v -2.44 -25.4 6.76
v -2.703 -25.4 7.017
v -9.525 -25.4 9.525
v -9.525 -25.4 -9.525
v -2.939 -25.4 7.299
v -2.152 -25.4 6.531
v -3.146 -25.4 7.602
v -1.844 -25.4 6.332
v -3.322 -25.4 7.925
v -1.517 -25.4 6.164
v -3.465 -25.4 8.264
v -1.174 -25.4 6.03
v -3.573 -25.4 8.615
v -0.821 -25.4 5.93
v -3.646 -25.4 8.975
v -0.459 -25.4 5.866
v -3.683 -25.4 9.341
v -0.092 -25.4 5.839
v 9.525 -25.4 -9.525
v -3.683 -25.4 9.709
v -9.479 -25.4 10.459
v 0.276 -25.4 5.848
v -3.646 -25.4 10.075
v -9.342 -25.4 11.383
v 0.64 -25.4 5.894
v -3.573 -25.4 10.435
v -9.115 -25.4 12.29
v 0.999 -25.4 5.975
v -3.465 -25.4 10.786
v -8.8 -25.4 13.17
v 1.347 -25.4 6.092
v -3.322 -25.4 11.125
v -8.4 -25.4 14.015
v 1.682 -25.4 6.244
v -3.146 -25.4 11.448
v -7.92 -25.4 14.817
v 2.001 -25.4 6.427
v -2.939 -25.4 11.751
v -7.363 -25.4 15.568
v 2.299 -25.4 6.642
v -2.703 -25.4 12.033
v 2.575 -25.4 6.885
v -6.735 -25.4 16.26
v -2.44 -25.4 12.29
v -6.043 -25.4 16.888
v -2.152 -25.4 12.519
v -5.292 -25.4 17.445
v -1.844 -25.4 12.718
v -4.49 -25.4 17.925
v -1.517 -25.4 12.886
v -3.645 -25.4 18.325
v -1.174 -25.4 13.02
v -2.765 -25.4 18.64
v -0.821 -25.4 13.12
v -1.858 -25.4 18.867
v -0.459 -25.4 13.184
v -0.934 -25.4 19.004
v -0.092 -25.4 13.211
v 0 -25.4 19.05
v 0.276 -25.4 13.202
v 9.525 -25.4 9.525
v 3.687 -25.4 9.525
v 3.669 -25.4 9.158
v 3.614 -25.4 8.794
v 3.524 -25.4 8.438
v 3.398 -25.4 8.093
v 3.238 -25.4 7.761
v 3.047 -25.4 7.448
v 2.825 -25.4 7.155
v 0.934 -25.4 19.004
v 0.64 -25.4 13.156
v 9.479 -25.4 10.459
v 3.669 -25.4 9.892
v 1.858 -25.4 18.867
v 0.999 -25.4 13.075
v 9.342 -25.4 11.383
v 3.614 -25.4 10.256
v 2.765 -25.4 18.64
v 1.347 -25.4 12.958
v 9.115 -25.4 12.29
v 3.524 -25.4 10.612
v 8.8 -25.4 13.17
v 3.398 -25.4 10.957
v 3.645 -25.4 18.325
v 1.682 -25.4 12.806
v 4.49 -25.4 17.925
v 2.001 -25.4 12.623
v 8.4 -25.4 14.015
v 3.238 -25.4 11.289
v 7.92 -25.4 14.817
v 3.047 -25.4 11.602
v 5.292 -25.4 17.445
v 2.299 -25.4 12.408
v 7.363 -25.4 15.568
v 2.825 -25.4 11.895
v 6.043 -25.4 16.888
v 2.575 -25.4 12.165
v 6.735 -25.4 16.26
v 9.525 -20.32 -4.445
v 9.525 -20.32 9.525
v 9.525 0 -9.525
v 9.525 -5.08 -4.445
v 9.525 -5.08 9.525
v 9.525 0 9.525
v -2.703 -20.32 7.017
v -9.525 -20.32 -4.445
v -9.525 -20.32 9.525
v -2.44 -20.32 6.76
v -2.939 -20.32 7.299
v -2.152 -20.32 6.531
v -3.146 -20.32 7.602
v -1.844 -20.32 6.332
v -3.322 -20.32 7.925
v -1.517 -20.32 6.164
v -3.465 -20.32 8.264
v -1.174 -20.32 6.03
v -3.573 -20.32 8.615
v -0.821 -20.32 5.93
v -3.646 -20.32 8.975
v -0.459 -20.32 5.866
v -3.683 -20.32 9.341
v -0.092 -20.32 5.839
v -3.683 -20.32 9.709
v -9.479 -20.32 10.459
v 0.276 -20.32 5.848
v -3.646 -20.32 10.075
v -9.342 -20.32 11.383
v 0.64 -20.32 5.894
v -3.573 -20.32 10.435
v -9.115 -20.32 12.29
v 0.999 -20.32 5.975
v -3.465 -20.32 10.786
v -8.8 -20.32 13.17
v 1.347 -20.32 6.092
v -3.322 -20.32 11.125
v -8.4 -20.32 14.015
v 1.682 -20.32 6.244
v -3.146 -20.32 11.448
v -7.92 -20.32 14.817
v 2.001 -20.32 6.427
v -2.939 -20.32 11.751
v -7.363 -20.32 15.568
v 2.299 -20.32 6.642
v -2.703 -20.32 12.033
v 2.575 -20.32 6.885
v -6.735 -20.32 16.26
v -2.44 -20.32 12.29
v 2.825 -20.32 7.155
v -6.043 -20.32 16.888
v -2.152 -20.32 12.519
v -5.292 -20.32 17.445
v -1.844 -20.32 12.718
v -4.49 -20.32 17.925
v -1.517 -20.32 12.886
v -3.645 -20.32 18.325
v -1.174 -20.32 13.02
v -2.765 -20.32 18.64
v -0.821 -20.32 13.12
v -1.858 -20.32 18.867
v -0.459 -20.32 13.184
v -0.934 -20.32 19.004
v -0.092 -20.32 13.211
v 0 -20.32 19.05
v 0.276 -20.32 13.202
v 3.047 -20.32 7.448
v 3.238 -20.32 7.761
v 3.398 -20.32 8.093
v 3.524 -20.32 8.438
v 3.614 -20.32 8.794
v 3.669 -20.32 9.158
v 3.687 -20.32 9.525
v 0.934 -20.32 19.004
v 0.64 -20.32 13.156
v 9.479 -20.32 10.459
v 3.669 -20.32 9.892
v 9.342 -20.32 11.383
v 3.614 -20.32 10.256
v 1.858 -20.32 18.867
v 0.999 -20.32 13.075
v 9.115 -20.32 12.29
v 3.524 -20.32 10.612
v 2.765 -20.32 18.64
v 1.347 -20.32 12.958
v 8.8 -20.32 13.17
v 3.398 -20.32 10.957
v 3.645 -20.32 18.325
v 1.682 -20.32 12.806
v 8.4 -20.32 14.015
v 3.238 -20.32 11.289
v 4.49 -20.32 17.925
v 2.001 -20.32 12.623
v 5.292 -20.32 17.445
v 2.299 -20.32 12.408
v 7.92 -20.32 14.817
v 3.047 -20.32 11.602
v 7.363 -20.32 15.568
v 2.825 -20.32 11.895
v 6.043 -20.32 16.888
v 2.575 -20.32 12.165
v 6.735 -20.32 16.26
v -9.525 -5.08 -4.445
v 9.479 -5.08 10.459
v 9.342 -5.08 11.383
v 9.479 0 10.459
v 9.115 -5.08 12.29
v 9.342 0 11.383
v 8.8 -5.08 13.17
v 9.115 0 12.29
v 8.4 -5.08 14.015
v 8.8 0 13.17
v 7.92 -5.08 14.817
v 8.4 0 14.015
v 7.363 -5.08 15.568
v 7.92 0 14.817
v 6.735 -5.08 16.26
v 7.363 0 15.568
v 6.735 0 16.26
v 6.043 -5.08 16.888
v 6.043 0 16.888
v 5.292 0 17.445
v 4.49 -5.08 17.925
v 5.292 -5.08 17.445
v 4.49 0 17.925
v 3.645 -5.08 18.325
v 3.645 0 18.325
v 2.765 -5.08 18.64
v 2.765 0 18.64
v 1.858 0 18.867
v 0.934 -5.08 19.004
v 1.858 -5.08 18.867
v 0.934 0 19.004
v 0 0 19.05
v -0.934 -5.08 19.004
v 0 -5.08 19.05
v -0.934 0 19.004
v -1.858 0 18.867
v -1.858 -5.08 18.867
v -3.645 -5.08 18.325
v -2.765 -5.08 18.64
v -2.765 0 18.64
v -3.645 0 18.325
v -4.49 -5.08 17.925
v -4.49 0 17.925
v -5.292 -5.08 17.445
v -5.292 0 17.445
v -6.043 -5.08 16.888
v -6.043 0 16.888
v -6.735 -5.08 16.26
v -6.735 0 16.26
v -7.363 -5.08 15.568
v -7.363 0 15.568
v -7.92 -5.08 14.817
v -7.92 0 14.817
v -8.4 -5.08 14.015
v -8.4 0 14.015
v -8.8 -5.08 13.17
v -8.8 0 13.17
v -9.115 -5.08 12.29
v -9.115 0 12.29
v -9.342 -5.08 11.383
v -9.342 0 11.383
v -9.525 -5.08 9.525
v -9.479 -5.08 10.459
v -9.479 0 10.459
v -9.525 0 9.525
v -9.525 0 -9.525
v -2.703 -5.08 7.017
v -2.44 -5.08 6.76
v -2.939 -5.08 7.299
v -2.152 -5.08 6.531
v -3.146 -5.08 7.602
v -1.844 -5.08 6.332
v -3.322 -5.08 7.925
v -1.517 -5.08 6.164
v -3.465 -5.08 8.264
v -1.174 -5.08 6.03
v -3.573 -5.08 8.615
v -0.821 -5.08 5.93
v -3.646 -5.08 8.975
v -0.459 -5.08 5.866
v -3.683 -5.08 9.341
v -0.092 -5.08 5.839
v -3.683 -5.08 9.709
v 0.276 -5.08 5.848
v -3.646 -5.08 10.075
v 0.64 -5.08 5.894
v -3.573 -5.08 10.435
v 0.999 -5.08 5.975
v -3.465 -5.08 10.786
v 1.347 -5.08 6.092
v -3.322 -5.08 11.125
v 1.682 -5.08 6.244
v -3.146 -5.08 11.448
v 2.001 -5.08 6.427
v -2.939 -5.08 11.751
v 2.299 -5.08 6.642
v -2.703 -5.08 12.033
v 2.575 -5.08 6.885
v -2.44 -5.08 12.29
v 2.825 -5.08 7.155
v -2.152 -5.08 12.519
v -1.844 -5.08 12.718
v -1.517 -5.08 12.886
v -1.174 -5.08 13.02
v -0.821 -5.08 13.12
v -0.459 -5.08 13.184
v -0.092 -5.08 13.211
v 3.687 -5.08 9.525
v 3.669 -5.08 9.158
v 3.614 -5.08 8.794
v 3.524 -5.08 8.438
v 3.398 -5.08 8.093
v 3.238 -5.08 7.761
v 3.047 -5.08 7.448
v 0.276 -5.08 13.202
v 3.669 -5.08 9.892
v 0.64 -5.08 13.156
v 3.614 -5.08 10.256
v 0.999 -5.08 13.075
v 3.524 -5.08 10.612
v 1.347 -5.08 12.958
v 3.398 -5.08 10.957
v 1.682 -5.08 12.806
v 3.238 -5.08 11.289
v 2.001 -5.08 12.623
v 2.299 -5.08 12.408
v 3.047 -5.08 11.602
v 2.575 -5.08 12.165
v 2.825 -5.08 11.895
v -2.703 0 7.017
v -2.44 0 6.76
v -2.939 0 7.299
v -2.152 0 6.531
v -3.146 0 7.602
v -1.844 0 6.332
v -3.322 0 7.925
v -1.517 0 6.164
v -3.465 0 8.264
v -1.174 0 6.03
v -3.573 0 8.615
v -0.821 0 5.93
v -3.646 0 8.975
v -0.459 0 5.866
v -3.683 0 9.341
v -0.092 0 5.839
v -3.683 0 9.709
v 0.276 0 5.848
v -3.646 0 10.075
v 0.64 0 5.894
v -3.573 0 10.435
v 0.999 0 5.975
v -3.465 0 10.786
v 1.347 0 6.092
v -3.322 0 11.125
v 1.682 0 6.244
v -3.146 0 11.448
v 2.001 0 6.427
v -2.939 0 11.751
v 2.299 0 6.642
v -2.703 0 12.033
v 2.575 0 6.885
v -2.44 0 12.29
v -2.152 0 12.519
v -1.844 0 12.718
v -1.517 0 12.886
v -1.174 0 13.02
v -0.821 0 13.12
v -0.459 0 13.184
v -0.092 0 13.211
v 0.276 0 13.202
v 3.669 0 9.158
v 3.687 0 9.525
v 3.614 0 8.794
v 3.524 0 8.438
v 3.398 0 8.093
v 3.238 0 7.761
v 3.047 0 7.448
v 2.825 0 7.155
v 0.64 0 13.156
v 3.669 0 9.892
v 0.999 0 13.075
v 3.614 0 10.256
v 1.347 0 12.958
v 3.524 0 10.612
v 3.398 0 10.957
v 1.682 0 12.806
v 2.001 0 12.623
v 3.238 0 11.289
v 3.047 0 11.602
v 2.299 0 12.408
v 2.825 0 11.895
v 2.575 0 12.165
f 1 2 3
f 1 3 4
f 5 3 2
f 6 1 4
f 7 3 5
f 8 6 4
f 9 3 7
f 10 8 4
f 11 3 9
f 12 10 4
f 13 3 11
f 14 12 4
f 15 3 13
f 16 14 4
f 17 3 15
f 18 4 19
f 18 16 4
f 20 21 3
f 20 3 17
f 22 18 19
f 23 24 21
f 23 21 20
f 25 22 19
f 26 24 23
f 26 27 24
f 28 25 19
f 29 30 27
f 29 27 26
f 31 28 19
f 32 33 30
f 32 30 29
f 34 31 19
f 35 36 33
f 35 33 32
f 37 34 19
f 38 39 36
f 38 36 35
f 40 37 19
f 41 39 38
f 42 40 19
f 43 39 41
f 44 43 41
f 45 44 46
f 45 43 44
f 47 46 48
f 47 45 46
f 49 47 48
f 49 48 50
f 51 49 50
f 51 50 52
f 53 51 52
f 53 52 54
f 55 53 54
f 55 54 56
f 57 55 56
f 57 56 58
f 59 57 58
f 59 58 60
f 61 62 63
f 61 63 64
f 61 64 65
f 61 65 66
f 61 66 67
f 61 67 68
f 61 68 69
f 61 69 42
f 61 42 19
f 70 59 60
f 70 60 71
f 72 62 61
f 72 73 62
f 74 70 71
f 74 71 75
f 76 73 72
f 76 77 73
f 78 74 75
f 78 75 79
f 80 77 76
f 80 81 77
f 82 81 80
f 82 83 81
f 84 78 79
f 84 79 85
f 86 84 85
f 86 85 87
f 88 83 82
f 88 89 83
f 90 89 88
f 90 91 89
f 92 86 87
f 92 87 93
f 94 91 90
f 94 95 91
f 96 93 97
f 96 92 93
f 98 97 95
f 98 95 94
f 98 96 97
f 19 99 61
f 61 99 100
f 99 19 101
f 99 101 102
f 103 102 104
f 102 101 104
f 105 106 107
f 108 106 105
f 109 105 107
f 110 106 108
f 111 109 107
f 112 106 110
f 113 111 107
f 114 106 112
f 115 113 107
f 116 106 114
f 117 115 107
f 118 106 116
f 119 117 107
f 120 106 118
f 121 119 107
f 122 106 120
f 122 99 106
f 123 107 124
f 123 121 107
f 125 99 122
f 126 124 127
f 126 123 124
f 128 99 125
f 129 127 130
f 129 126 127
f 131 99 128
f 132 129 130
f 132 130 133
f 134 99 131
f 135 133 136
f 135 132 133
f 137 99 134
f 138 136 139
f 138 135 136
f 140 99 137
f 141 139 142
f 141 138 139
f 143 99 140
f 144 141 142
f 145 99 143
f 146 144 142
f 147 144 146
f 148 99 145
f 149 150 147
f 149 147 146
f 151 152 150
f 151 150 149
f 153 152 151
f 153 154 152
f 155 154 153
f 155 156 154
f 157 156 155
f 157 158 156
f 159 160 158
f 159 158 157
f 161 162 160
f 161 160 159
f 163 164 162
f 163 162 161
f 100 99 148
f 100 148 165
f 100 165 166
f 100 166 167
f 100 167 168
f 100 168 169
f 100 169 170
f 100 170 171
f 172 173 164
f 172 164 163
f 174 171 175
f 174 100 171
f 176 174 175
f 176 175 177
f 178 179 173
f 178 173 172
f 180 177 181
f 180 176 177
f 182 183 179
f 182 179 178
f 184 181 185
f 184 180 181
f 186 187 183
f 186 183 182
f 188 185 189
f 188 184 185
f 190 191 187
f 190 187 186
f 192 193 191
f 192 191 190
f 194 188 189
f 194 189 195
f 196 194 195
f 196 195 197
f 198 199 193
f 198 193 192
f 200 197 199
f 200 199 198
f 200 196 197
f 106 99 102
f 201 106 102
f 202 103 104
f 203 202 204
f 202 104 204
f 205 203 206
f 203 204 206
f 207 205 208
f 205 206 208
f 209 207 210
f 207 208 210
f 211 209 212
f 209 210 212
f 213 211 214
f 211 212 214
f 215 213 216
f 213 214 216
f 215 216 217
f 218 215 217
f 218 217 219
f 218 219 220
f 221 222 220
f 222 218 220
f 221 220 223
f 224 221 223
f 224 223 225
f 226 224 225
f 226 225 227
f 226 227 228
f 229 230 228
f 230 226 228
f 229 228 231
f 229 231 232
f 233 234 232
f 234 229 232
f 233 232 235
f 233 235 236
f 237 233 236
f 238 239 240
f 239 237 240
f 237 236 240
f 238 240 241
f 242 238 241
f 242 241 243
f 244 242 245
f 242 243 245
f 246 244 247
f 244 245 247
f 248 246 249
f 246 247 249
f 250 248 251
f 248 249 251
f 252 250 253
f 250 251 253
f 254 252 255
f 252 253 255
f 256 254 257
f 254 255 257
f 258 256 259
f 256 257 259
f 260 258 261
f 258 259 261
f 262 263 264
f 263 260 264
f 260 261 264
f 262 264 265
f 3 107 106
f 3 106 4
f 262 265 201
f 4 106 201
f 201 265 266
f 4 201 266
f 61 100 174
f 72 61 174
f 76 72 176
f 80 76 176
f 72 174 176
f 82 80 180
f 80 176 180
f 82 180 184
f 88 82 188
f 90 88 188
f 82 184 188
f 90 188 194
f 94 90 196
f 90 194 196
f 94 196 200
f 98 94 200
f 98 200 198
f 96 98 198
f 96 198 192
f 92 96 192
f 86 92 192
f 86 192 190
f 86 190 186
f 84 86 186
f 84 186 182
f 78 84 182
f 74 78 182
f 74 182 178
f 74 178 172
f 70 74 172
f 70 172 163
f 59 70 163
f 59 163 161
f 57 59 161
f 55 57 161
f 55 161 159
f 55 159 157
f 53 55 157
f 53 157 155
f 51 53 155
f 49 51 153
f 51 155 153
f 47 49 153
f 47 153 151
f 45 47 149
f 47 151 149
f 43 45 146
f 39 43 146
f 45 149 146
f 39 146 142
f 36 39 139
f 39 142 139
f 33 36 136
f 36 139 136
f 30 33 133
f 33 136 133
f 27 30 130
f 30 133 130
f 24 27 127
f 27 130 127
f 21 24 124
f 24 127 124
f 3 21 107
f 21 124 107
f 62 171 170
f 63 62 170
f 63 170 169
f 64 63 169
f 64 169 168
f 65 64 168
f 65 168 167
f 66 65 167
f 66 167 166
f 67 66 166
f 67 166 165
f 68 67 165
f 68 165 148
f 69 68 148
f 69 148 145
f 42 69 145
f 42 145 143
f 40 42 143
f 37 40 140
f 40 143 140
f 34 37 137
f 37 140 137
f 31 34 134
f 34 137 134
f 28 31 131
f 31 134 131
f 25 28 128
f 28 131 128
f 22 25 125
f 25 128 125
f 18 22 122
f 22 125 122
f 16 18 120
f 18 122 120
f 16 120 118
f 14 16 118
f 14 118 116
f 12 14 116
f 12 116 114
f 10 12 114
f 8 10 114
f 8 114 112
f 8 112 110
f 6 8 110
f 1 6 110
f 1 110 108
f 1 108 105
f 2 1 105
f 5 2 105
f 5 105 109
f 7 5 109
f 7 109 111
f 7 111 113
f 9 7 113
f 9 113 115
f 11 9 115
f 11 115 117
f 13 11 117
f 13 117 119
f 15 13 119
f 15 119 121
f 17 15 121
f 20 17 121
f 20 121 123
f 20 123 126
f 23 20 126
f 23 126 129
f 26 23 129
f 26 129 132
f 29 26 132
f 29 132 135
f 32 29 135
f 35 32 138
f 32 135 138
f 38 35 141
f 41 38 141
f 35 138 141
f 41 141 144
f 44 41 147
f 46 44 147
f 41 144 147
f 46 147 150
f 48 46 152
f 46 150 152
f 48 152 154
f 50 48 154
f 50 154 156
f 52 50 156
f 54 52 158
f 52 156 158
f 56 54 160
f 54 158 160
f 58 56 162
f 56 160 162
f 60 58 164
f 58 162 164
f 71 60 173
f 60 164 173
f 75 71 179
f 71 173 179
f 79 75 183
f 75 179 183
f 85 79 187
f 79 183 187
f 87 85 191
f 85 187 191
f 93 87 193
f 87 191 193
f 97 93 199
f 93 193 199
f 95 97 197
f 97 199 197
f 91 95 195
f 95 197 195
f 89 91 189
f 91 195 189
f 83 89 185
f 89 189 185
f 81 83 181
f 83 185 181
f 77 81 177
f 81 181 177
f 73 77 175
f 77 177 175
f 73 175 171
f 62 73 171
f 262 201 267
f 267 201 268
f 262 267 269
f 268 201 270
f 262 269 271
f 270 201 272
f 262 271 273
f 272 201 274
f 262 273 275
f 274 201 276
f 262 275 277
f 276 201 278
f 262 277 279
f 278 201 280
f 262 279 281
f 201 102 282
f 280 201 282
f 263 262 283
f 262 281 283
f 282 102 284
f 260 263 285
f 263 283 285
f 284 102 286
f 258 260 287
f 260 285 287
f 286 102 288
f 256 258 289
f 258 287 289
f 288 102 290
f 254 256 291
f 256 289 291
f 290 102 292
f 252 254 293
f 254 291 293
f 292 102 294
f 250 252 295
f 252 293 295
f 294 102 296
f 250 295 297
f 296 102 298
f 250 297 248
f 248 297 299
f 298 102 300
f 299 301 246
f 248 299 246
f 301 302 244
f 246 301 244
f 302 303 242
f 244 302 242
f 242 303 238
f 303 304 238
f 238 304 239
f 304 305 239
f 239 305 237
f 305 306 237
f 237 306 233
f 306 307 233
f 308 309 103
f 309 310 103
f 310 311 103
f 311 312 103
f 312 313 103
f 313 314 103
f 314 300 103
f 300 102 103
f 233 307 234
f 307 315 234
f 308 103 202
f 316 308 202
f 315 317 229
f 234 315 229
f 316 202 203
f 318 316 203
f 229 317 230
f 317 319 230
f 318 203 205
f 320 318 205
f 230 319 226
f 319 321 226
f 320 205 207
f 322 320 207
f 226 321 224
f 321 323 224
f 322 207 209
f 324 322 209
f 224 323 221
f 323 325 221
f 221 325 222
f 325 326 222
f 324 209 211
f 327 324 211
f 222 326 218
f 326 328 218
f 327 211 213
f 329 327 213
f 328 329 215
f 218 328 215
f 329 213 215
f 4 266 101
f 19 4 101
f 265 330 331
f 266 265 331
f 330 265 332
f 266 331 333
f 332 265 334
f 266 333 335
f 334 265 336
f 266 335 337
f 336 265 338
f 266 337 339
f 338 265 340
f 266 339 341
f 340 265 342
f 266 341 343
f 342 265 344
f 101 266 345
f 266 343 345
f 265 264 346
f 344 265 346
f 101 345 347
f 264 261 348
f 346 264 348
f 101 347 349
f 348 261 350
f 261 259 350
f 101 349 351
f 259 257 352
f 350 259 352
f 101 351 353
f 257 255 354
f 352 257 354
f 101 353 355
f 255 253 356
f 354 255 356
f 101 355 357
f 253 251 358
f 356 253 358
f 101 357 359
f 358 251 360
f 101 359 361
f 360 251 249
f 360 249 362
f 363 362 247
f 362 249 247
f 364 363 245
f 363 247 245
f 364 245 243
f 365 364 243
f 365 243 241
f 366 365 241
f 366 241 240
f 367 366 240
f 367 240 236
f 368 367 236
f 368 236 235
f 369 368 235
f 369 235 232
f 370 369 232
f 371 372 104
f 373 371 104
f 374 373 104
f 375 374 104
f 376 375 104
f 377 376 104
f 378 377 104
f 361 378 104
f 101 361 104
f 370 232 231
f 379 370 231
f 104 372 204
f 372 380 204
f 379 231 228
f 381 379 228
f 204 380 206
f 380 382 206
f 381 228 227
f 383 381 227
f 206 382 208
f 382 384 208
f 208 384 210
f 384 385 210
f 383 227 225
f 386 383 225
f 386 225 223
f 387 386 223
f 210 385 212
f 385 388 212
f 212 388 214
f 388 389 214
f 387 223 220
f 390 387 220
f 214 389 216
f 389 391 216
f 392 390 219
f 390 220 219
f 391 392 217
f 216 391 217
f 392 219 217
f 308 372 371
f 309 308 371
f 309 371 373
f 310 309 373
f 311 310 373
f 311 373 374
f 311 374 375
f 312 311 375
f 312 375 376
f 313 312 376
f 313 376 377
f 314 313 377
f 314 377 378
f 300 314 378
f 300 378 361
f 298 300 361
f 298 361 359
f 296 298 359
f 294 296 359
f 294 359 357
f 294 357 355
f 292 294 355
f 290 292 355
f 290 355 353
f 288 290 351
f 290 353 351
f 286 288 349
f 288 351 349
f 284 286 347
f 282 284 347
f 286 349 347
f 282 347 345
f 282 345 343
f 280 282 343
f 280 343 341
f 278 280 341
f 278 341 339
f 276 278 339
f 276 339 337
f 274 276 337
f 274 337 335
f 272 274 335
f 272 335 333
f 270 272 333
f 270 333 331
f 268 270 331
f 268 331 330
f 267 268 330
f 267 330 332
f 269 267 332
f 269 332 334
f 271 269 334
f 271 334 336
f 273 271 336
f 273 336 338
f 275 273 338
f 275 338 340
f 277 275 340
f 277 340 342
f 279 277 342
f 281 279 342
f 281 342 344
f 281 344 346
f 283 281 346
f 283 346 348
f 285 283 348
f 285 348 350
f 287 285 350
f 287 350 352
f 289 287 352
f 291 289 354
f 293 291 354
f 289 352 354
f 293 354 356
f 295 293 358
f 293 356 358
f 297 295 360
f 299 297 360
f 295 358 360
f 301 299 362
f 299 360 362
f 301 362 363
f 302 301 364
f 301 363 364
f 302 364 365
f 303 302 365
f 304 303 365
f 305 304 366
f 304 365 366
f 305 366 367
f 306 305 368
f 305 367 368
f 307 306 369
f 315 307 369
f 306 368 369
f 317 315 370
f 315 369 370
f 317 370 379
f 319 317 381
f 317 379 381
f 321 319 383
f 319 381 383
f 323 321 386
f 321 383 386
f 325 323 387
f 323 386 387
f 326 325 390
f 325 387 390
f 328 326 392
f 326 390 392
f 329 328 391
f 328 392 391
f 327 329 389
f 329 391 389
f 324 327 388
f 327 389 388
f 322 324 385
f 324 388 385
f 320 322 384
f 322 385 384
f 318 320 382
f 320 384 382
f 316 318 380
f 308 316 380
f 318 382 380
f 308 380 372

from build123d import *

# Parameters (mm, degrees)
F1_DEPTH      = 25.4
F2_W          = 15.24
F2_H          = 27.5789452819
F3_DEPTH      = 9.526
F3_DEPTH_BACK = 9.526


with BuildPart() as f1:
    # F0 (on Front) → F1 (new body)
    with BuildSketch(Plane.XZ):
        with BuildLine():
            Line((3.6874021567, 9.525), (9.525, 9.525))
            ThreePointArc((9.525, 9.525), (0, 19.05), (-9.525, 9.525))
            Line((-9.525, 9.525), (-3.6874021567, 9.525))
            ThreePointArc((-3.6874021567, 9.525), (0, 13.2124021567), (3.6874021567, 9.525))
        make_face()
        with BuildLine():
            Line((9.525, -9.525), (9.525, 9.525))
            ThreePointArc((9.525, 9.525), (0, 0), (-9.525, 9.525))
            Line((-9.525, 9.525), (-9.525, -9.525))
            Line((-9.525, -9.525), (9.525, -9.525))
        make_face()
        with BuildLine():
            ThreePointArc((-9.525, 9.525), (0, 0), (9.525, 9.525))
            Line((9.525, 9.525), (3.6874021567, 9.525))
            ThreePointArc((3.6874021567, 9.525), (0, 5.8375978433), (-3.6874021567, 9.525))
            Line((-3.6874021567, 9.525), (-9.525, 9.525))
        make_face()
    extrude(amount=F1_DEPTH)

    # F2 (on Right) → F3 (cut, two sides)
    with BuildSketch(Plane.YZ) as f3_sk:
        with Locations((-12.7, 9.344472641)):
            Rectangle(F2_W, F2_H)
    extrude(amount=F3_DEPTH, mode=Mode.SUBTRACT)
    extrude(f3_sk.sketch, amount=-F3_DEPTH_BACK, mode=Mode.SUBTRACT)


solid = f1.part
